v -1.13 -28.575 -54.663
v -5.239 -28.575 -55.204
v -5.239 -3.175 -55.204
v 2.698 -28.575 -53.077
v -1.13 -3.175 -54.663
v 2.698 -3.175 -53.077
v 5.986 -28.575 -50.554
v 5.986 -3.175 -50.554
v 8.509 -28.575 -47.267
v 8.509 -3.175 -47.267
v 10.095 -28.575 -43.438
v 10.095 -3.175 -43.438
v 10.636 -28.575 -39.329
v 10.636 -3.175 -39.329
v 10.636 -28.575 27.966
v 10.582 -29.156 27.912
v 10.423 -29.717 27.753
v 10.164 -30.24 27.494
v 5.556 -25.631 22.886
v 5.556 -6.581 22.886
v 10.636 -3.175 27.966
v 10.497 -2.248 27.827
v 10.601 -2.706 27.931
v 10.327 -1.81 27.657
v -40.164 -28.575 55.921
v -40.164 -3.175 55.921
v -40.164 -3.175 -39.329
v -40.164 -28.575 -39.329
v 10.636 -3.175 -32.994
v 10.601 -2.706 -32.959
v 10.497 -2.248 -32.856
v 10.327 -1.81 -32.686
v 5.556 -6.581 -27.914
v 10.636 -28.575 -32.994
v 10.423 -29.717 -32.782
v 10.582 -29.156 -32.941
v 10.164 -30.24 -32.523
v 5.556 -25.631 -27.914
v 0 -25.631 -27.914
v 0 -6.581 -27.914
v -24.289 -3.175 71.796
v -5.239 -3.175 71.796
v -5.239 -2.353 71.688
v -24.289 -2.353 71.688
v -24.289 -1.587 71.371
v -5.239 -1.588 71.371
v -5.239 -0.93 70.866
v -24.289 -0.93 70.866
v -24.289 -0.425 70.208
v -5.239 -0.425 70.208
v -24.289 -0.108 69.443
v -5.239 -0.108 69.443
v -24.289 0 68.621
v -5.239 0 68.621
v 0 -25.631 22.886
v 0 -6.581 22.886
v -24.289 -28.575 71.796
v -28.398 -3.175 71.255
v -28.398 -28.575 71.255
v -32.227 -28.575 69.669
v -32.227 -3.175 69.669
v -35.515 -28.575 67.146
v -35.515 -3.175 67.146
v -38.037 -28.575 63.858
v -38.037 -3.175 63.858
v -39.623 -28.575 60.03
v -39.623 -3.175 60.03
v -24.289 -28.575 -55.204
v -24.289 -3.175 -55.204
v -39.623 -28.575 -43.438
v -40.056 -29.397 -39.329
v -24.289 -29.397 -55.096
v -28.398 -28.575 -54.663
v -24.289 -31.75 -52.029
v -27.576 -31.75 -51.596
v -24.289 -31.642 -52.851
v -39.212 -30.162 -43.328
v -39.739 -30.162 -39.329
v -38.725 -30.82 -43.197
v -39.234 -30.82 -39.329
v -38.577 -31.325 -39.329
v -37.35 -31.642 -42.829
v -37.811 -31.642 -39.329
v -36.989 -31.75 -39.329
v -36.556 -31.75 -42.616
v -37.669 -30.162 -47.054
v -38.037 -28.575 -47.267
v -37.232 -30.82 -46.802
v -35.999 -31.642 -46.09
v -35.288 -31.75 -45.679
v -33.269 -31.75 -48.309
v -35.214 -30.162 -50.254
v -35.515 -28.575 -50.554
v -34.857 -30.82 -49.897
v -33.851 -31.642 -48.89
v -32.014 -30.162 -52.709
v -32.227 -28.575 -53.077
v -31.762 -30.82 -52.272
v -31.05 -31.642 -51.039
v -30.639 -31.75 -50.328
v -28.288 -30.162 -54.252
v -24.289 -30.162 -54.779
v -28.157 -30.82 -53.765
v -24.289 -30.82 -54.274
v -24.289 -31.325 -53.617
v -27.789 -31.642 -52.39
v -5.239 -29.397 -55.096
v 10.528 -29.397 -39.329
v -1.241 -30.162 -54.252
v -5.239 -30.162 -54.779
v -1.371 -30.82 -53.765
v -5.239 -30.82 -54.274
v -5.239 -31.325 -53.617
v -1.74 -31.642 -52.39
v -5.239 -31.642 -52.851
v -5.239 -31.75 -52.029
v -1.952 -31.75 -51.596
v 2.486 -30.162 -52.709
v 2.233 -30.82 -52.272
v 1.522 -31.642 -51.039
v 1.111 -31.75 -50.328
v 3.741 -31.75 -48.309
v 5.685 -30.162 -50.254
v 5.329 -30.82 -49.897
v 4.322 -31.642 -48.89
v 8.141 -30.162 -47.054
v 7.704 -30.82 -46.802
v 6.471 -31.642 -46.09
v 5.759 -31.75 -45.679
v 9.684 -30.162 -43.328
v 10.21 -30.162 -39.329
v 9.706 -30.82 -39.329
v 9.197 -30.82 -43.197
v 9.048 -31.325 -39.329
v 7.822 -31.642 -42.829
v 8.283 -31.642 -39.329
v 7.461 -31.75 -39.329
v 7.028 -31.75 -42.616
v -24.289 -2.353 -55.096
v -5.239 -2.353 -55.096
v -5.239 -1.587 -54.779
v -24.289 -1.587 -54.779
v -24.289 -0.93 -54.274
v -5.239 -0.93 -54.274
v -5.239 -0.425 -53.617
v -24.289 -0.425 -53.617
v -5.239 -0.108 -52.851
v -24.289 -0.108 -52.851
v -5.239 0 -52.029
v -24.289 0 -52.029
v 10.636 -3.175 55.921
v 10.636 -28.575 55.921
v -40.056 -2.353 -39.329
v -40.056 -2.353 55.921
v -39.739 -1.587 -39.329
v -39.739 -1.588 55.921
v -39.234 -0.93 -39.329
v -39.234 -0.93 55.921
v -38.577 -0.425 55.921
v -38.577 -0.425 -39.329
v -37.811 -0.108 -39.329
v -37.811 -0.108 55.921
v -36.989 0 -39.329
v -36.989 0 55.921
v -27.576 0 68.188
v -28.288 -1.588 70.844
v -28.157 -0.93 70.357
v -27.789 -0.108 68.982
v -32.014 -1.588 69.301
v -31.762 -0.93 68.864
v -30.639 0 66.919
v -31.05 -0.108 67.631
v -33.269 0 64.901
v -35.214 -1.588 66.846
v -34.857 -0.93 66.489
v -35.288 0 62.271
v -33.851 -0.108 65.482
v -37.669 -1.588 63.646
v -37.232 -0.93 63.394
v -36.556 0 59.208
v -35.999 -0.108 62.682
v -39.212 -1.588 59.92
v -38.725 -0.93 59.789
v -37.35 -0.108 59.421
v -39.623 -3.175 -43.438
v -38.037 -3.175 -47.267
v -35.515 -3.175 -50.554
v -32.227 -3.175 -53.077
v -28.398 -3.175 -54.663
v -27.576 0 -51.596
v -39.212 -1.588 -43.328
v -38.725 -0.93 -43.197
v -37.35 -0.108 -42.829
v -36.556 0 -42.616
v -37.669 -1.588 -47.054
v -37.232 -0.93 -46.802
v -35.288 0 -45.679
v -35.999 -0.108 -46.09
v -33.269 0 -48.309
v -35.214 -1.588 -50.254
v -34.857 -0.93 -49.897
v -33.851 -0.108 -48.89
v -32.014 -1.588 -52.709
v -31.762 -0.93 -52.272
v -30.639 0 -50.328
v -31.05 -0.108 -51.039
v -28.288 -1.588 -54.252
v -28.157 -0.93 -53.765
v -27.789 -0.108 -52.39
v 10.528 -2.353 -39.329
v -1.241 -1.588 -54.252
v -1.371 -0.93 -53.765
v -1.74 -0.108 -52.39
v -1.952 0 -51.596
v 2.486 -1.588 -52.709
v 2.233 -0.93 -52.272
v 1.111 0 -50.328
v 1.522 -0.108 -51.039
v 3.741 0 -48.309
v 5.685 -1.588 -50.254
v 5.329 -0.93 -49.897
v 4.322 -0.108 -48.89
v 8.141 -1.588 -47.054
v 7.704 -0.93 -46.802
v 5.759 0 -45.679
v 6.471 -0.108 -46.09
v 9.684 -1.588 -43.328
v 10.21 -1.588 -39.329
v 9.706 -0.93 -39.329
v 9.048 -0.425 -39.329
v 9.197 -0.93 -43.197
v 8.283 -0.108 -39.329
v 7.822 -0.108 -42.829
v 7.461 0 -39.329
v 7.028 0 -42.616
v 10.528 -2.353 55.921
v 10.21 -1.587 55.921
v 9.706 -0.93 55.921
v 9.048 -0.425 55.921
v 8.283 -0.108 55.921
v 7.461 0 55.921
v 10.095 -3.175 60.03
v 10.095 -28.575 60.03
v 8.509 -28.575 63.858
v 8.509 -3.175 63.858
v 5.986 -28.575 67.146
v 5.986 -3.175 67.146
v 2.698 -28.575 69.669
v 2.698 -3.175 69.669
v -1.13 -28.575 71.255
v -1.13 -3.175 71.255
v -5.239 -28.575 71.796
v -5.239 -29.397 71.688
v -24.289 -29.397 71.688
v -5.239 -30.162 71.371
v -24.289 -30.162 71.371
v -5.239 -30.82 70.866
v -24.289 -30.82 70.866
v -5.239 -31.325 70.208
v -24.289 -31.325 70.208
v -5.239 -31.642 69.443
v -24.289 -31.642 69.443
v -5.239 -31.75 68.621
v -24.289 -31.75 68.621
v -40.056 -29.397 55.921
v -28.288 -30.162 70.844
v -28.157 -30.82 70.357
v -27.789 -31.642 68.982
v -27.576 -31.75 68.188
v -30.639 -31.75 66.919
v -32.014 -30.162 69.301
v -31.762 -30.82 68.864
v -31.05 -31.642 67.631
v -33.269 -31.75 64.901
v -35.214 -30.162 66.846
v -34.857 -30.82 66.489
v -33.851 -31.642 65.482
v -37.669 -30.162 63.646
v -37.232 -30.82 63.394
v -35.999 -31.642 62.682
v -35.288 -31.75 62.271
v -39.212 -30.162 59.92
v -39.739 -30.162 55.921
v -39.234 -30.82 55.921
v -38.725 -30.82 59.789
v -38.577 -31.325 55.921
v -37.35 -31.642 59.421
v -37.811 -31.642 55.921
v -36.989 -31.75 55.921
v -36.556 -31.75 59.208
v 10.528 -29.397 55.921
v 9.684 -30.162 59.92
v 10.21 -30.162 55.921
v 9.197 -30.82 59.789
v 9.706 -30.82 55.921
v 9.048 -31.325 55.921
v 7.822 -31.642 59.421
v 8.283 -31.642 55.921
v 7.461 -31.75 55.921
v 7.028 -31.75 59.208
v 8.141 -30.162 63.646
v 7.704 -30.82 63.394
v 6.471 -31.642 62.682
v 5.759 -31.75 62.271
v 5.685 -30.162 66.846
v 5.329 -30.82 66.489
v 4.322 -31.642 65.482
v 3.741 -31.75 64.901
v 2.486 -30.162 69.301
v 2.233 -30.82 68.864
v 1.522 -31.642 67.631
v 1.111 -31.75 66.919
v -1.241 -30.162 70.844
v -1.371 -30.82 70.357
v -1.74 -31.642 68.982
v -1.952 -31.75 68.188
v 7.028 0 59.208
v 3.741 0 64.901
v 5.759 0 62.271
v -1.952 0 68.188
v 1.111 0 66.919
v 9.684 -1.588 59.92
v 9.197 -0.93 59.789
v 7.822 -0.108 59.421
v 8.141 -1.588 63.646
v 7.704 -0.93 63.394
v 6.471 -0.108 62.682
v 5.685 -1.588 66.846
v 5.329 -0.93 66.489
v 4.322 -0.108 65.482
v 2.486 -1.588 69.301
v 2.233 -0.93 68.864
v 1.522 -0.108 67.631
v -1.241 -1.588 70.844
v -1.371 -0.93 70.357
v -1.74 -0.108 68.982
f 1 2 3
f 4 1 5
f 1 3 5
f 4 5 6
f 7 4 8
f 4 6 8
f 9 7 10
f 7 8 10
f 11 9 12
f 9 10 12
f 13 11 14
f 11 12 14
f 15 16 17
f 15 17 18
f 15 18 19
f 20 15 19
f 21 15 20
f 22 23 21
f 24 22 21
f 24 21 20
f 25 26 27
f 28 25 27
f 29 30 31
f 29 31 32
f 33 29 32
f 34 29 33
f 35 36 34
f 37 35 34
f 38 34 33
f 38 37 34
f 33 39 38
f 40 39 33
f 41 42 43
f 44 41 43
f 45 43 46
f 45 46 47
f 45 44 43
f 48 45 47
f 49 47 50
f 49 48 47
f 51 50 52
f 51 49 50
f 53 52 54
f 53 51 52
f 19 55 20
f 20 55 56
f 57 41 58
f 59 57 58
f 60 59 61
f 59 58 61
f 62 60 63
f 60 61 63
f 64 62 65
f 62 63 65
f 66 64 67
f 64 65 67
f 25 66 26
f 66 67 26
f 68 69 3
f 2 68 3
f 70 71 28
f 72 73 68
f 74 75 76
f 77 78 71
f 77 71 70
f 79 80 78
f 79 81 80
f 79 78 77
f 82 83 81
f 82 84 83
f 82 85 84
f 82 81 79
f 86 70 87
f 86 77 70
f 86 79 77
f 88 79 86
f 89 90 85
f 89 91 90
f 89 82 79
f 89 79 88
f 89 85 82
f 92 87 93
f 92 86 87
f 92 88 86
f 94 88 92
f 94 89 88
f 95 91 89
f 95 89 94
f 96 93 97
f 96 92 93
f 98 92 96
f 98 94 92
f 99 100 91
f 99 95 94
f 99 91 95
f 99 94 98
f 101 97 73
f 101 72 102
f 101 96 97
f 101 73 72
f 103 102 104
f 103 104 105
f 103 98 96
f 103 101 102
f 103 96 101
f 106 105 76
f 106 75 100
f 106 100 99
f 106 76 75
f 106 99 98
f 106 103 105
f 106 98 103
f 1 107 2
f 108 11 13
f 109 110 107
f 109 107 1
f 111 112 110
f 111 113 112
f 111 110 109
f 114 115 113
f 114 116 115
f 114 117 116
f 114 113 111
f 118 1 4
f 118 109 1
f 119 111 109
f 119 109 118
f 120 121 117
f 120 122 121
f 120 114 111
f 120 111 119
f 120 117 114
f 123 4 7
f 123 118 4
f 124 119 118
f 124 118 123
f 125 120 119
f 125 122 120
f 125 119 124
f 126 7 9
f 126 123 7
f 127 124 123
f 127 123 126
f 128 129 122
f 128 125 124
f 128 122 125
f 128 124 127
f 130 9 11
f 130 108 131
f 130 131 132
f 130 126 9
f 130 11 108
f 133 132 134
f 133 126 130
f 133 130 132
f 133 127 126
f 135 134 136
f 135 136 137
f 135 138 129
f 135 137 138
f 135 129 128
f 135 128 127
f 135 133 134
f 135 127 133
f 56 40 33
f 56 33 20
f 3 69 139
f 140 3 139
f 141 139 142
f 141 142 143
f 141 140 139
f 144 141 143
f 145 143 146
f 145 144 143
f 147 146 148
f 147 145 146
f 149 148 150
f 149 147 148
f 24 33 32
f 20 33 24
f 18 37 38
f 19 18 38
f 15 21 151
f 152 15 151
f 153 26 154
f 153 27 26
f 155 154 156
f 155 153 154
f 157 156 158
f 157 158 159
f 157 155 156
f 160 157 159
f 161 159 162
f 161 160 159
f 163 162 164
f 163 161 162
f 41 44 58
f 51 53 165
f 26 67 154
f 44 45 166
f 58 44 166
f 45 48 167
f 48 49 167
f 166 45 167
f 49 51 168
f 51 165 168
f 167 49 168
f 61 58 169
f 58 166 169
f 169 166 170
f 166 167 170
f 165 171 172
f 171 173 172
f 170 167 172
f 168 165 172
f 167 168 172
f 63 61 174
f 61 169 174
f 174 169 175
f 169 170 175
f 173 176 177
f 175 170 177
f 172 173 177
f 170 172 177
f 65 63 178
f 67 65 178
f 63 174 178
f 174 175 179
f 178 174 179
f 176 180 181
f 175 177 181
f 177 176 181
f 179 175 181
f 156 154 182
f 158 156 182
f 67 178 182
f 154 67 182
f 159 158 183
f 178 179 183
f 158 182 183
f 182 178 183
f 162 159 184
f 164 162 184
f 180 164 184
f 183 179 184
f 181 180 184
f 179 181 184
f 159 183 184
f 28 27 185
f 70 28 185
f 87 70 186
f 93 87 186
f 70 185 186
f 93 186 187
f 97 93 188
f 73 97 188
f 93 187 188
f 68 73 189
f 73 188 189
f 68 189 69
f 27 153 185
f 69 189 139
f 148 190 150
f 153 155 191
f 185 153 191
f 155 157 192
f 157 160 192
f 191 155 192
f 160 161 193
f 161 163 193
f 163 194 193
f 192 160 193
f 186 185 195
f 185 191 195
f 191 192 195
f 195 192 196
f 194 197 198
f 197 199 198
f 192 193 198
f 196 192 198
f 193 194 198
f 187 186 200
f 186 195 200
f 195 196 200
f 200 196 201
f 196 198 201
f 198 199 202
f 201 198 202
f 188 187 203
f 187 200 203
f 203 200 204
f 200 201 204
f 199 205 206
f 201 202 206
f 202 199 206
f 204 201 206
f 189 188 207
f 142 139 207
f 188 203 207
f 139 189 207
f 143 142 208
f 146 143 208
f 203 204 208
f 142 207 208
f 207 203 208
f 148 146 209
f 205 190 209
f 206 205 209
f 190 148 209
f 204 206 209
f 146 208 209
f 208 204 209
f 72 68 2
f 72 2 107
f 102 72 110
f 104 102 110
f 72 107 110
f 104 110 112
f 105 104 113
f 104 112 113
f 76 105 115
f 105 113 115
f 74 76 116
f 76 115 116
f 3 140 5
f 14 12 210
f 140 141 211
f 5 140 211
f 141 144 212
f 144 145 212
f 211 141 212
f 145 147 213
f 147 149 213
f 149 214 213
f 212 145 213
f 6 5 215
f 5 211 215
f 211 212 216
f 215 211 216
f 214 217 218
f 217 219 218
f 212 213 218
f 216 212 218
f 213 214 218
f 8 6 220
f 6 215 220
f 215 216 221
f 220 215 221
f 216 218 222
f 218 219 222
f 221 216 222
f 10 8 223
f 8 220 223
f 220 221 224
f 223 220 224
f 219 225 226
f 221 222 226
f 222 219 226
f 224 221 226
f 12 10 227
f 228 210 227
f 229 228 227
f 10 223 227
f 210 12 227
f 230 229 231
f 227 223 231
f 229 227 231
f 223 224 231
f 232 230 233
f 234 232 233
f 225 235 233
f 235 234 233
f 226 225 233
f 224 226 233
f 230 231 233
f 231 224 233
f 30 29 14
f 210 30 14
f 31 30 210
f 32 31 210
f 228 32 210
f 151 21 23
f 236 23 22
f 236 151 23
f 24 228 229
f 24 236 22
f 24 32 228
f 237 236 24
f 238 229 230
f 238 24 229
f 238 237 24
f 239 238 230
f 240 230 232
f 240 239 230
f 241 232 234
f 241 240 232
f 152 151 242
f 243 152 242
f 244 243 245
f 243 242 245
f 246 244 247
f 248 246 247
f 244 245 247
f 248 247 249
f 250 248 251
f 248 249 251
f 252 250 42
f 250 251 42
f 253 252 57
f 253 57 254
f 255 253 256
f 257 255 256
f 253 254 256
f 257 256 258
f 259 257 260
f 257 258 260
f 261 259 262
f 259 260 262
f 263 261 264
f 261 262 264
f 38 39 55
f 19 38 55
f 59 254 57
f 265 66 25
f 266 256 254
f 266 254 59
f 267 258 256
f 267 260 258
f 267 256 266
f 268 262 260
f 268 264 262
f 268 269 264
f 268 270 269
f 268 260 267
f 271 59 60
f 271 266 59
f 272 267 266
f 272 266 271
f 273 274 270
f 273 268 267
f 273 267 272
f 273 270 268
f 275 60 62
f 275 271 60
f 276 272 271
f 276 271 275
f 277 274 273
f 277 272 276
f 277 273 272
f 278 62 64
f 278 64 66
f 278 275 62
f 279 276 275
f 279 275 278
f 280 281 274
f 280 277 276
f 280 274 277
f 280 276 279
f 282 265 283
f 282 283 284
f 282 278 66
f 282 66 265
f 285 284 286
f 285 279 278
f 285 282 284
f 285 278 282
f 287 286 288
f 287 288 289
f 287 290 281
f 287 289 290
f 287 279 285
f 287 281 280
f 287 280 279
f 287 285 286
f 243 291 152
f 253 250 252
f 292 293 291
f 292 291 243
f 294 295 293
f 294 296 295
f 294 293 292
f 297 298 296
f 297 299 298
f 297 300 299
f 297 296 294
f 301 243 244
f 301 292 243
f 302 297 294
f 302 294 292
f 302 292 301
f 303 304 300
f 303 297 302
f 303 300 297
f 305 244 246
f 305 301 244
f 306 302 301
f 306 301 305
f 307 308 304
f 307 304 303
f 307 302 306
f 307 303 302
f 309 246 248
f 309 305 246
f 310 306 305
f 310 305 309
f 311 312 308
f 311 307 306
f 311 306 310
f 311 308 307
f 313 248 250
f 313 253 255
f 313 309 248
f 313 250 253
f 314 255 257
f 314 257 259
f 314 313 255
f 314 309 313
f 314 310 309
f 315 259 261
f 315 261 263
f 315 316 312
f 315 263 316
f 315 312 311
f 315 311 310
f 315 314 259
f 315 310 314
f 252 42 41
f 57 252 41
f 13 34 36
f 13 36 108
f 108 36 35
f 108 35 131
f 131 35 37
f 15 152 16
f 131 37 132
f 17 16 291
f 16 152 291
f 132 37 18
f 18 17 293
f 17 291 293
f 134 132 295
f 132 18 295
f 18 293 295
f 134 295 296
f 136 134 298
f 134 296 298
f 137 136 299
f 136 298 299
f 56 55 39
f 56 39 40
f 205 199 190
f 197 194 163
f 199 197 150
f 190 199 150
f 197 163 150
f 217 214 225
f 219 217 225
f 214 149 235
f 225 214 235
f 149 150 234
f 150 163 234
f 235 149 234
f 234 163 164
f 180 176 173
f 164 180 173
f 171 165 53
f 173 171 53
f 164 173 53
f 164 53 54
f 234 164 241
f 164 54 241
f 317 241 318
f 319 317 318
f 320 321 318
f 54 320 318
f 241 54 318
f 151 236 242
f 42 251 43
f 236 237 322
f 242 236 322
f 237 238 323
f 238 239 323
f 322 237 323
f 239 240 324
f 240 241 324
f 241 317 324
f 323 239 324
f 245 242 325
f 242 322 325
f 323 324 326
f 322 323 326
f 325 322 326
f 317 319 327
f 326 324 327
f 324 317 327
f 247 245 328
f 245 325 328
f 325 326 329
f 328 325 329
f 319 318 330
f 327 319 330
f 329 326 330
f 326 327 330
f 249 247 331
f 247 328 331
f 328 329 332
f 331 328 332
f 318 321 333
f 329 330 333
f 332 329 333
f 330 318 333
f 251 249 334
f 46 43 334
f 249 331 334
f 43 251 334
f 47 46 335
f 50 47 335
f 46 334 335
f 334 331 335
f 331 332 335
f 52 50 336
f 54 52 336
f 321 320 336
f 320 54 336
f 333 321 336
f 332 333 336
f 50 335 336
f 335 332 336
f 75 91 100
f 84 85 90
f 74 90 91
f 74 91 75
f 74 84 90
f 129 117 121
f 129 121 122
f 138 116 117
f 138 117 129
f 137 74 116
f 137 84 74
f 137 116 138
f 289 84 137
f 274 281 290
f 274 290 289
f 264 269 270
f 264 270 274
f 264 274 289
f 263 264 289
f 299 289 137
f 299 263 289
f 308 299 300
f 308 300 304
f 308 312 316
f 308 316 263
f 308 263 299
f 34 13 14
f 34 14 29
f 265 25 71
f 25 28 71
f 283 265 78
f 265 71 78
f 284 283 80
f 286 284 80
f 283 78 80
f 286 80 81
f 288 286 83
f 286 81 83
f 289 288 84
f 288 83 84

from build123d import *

# Parameters (mm, degrees)
F1_DEPTH     = 31.75
F2_R         = 3.175
F3_W         = 19.05
F3_H         = 50.8
F4_DEPTH     = 10.6367849431
F5_T4_DEPTH  = 76.9282991577
F5_T10_DEPTH = 45.1782991577
F5_T16_DEPTH = 45.1782991577
F5_T22_DEPTH = 76.9282991577


# Not quite as in the source:
# - a fillet or chamfer that OpenCascade refuses, or shapes differently, is made with other operations: its cross-section is extruded or revolved along the edge and cut away or added


with BuildPart() as f1:
    # F0 (on Front) → F1 (new body)
    with BuildSketch(Plane.XZ):
        with BuildLine():
            Line((-5.2392150569, 71.7959681749), (-24.2892150569, 71.7959681749))
            ThreePointArc((-24.2892150569, 71.7959681749), (-35.5145352082, 67.1462883263), (-40.1642150569, 55.9209681749))
            Line((-40.1642150569, 55.9209681749), (-40.1642150569, -39.3290318251))
            ThreePointArc((-40.1642150569, -39.3290318251), (-35.5145352082, -50.5543519764), (-24.2892150569, -55.2040318251))
            Line((-24.2892150569, -55.2040318251), (-5.2392150569, -55.2040318251))
            ThreePointArc((-5.2392150569, -55.2040318251), (5.9861050945, -50.5543519764), (10.6357849431, -39.3290318251))
            Line((10.6357849431, -39.3290318251), (10.6357849431, 55.9209681749))
            ThreePointArc((10.6357849431, 55.9209681749), (5.9861050945, 67.1462883263), (-5.2392150569, 71.7959681749))
        make_face()
    extrude(amount=F1_DEPTH)

    # F2
    f2_edges = [f1.edges().sort_by_distance(p)[0] for p in [
        (-24.289215, -15.875, -55.204032),
        (-5.239215, -15.875, -55.204032),
        (-14.764215, 0, -55.204032),
        (-14.764215, -31.75, -55.204032),
        (-5.239215, -15.875, 71.795968),
        (-24.289215, -15.875, 71.795968),
        (-14.764215, 0, 71.795968),
        (-14.764215, -31.75, 71.795968),
        (10.635785, 0, 8.295968),
        (10.635785, -31.75, 8.295968),
        (5.986105, 0, 67.146288),
        (5.986105, -31.75, 67.146288),
        (-35.514535, 0, 67.146288),
        (-35.514535, -31.75, 67.146288),
        (-40.164215, 0, 8.295968),
        (-40.164215, -31.75, 8.295968),
        (-35.514535, 0, -50.554352),
        (-35.514535, -31.75, -50.554352),
        (5.986105, 0, -50.554352),
        (5.986105, -31.75, -50.554352),
    ]]
    fillet(f2_edges, radius=F2_R)

    # F3 (on Right) → F4 (cut, through all)
    with BuildSketch(Plane.YZ):
        with Locations((-16.1061841063, -2.5141499803)):
            Rectangle(F3_W, F3_H)
    extrude(amount=F4_DEPTH, mode=Mode.SUBTRACT)

    # F5: chamfer of 5.08 on 4 edges, made by hand


with BuildPart() as f5_tool2:
    # F5_s3 → F5_t4 (new body)
    with BuildSketch(Plane.XY.offset(35.9499995986)):
        Polygon((10.6357849431, -30.7111841063), (5.5557849431, -25.6311841063), (10.6357849431, -25.6311841063), align=None)
    extrude(amount=-F5_T4_DEPTH)

    split(bisect_by=Plane(origin=(-11.1791825186, 0, -11.1791825186), x_dir=(0, 1, 0), z_dir=(0.7071067812, 0, 0.7071067812)), keep=Keep.TOP)

    split(bisect_by=Plane(origin=(-8.6650325383, 0, 8.6650325383), x_dir=(0, 1, 0), z_dir=(0.7071067812, 0, -0.7071067812)), keep=Keep.TOP)


with BuildPart() as f1_1:
    add(f1.part)

    # F5_t1: cut F5_tool2
    add(f5_tool2.part, mode=Mode.SUBTRACT)


with BuildPart() as f5_tool8:
    # F5_s9 → F5_t10 (new body)
    with BuildSketch(Plane.XZ.offset(-6.4829654725)):
        Polygon((10.6357849431, 27.9658500197), (5.5557849431, 22.8858500197), (10.6357849431, 22.8858500197), align=None)
    extrude(amount=F5_T10_DEPTH)

    split(bisect_by=Plane(origin=(-10.0376995816, -10.0376995816, 0), x_dir=(0, 0, 1), z_dir=(0.7071067812, 0.7071067812, 0)), keep=Keep.TOP)

    split(bisect_by=Plane(origin=(6.0684845247, -6.0684845247, 0), x_dir=(0, 0, 1), z_dir=(0.7071067812, -0.7071067812, 0)), keep=Keep.TOP)


with BuildPart() as f1_2:
    add(f1_1.part)

    # F5_t7: cut F5_tool8
    add(f5_tool8.part, mode=Mode.SUBTRACT)


with BuildPart() as f5_tool14:
    # F5_s15 → F5_t16 (new body)
    with BuildSketch(Plane.XZ.offset(38.6953336852)):
        Polygon((10.6357849431, -32.9941499803), (5.5557849431, -27.9141499803), (10.6357849431, -27.9141499803), align=None)
    extrude(amount=-F5_T16_DEPTH)

    split(bisect_by=Plane(origin=(-10.0376995816, -10.0376995816, 0), x_dir=(0, 0, 1), z_dir=(0.7071067812, 0.7071067812, 0)), keep=Keep.TOP)

    split(bisect_by=Plane(origin=(6.0684845247, -6.0684845247, 0), x_dir=(0, 0, 1), z_dir=(0.7071067812, -0.7071067812, 0)), keep=Keep.TOP)


with BuildPart() as f1_3:
    add(f1_2.part)

    # F5_t13: cut F5_tool14
    add(f5_tool14.part, mode=Mode.SUBTRACT)


with BuildPart() as f5_tool20:
    # F5_s21 → F5_t22 (new body)
    with BuildSketch(Plane.XY.offset(-40.9782995592)):
        Polygon((10.6357849431, -1.5011841063), (5.5557849431, -6.5811841063), (10.6357849431, -6.5811841063), align=None)
    extrude(amount=F5_T22_DEPTH)

    split(bisect_by=Plane(origin=(-11.1791825186, 0, -11.1791825186), x_dir=(0, 1, 0), z_dir=(0.7071067812, 0, 0.7071067812)), keep=Keep.TOP)

    split(bisect_by=Plane(origin=(-8.6650325383, 0, 8.6650325383), x_dir=(0, 1, 0), z_dir=(0.7071067812, 0, -0.7071067812)), keep=Keep.TOP)


with BuildPart() as f1_4:
    add(f1_3.part)

    # F5_t19: cut F5_tool20
    add(f5_tool20.part, mode=Mode.SUBTRACT)


solid = f1_4.part
